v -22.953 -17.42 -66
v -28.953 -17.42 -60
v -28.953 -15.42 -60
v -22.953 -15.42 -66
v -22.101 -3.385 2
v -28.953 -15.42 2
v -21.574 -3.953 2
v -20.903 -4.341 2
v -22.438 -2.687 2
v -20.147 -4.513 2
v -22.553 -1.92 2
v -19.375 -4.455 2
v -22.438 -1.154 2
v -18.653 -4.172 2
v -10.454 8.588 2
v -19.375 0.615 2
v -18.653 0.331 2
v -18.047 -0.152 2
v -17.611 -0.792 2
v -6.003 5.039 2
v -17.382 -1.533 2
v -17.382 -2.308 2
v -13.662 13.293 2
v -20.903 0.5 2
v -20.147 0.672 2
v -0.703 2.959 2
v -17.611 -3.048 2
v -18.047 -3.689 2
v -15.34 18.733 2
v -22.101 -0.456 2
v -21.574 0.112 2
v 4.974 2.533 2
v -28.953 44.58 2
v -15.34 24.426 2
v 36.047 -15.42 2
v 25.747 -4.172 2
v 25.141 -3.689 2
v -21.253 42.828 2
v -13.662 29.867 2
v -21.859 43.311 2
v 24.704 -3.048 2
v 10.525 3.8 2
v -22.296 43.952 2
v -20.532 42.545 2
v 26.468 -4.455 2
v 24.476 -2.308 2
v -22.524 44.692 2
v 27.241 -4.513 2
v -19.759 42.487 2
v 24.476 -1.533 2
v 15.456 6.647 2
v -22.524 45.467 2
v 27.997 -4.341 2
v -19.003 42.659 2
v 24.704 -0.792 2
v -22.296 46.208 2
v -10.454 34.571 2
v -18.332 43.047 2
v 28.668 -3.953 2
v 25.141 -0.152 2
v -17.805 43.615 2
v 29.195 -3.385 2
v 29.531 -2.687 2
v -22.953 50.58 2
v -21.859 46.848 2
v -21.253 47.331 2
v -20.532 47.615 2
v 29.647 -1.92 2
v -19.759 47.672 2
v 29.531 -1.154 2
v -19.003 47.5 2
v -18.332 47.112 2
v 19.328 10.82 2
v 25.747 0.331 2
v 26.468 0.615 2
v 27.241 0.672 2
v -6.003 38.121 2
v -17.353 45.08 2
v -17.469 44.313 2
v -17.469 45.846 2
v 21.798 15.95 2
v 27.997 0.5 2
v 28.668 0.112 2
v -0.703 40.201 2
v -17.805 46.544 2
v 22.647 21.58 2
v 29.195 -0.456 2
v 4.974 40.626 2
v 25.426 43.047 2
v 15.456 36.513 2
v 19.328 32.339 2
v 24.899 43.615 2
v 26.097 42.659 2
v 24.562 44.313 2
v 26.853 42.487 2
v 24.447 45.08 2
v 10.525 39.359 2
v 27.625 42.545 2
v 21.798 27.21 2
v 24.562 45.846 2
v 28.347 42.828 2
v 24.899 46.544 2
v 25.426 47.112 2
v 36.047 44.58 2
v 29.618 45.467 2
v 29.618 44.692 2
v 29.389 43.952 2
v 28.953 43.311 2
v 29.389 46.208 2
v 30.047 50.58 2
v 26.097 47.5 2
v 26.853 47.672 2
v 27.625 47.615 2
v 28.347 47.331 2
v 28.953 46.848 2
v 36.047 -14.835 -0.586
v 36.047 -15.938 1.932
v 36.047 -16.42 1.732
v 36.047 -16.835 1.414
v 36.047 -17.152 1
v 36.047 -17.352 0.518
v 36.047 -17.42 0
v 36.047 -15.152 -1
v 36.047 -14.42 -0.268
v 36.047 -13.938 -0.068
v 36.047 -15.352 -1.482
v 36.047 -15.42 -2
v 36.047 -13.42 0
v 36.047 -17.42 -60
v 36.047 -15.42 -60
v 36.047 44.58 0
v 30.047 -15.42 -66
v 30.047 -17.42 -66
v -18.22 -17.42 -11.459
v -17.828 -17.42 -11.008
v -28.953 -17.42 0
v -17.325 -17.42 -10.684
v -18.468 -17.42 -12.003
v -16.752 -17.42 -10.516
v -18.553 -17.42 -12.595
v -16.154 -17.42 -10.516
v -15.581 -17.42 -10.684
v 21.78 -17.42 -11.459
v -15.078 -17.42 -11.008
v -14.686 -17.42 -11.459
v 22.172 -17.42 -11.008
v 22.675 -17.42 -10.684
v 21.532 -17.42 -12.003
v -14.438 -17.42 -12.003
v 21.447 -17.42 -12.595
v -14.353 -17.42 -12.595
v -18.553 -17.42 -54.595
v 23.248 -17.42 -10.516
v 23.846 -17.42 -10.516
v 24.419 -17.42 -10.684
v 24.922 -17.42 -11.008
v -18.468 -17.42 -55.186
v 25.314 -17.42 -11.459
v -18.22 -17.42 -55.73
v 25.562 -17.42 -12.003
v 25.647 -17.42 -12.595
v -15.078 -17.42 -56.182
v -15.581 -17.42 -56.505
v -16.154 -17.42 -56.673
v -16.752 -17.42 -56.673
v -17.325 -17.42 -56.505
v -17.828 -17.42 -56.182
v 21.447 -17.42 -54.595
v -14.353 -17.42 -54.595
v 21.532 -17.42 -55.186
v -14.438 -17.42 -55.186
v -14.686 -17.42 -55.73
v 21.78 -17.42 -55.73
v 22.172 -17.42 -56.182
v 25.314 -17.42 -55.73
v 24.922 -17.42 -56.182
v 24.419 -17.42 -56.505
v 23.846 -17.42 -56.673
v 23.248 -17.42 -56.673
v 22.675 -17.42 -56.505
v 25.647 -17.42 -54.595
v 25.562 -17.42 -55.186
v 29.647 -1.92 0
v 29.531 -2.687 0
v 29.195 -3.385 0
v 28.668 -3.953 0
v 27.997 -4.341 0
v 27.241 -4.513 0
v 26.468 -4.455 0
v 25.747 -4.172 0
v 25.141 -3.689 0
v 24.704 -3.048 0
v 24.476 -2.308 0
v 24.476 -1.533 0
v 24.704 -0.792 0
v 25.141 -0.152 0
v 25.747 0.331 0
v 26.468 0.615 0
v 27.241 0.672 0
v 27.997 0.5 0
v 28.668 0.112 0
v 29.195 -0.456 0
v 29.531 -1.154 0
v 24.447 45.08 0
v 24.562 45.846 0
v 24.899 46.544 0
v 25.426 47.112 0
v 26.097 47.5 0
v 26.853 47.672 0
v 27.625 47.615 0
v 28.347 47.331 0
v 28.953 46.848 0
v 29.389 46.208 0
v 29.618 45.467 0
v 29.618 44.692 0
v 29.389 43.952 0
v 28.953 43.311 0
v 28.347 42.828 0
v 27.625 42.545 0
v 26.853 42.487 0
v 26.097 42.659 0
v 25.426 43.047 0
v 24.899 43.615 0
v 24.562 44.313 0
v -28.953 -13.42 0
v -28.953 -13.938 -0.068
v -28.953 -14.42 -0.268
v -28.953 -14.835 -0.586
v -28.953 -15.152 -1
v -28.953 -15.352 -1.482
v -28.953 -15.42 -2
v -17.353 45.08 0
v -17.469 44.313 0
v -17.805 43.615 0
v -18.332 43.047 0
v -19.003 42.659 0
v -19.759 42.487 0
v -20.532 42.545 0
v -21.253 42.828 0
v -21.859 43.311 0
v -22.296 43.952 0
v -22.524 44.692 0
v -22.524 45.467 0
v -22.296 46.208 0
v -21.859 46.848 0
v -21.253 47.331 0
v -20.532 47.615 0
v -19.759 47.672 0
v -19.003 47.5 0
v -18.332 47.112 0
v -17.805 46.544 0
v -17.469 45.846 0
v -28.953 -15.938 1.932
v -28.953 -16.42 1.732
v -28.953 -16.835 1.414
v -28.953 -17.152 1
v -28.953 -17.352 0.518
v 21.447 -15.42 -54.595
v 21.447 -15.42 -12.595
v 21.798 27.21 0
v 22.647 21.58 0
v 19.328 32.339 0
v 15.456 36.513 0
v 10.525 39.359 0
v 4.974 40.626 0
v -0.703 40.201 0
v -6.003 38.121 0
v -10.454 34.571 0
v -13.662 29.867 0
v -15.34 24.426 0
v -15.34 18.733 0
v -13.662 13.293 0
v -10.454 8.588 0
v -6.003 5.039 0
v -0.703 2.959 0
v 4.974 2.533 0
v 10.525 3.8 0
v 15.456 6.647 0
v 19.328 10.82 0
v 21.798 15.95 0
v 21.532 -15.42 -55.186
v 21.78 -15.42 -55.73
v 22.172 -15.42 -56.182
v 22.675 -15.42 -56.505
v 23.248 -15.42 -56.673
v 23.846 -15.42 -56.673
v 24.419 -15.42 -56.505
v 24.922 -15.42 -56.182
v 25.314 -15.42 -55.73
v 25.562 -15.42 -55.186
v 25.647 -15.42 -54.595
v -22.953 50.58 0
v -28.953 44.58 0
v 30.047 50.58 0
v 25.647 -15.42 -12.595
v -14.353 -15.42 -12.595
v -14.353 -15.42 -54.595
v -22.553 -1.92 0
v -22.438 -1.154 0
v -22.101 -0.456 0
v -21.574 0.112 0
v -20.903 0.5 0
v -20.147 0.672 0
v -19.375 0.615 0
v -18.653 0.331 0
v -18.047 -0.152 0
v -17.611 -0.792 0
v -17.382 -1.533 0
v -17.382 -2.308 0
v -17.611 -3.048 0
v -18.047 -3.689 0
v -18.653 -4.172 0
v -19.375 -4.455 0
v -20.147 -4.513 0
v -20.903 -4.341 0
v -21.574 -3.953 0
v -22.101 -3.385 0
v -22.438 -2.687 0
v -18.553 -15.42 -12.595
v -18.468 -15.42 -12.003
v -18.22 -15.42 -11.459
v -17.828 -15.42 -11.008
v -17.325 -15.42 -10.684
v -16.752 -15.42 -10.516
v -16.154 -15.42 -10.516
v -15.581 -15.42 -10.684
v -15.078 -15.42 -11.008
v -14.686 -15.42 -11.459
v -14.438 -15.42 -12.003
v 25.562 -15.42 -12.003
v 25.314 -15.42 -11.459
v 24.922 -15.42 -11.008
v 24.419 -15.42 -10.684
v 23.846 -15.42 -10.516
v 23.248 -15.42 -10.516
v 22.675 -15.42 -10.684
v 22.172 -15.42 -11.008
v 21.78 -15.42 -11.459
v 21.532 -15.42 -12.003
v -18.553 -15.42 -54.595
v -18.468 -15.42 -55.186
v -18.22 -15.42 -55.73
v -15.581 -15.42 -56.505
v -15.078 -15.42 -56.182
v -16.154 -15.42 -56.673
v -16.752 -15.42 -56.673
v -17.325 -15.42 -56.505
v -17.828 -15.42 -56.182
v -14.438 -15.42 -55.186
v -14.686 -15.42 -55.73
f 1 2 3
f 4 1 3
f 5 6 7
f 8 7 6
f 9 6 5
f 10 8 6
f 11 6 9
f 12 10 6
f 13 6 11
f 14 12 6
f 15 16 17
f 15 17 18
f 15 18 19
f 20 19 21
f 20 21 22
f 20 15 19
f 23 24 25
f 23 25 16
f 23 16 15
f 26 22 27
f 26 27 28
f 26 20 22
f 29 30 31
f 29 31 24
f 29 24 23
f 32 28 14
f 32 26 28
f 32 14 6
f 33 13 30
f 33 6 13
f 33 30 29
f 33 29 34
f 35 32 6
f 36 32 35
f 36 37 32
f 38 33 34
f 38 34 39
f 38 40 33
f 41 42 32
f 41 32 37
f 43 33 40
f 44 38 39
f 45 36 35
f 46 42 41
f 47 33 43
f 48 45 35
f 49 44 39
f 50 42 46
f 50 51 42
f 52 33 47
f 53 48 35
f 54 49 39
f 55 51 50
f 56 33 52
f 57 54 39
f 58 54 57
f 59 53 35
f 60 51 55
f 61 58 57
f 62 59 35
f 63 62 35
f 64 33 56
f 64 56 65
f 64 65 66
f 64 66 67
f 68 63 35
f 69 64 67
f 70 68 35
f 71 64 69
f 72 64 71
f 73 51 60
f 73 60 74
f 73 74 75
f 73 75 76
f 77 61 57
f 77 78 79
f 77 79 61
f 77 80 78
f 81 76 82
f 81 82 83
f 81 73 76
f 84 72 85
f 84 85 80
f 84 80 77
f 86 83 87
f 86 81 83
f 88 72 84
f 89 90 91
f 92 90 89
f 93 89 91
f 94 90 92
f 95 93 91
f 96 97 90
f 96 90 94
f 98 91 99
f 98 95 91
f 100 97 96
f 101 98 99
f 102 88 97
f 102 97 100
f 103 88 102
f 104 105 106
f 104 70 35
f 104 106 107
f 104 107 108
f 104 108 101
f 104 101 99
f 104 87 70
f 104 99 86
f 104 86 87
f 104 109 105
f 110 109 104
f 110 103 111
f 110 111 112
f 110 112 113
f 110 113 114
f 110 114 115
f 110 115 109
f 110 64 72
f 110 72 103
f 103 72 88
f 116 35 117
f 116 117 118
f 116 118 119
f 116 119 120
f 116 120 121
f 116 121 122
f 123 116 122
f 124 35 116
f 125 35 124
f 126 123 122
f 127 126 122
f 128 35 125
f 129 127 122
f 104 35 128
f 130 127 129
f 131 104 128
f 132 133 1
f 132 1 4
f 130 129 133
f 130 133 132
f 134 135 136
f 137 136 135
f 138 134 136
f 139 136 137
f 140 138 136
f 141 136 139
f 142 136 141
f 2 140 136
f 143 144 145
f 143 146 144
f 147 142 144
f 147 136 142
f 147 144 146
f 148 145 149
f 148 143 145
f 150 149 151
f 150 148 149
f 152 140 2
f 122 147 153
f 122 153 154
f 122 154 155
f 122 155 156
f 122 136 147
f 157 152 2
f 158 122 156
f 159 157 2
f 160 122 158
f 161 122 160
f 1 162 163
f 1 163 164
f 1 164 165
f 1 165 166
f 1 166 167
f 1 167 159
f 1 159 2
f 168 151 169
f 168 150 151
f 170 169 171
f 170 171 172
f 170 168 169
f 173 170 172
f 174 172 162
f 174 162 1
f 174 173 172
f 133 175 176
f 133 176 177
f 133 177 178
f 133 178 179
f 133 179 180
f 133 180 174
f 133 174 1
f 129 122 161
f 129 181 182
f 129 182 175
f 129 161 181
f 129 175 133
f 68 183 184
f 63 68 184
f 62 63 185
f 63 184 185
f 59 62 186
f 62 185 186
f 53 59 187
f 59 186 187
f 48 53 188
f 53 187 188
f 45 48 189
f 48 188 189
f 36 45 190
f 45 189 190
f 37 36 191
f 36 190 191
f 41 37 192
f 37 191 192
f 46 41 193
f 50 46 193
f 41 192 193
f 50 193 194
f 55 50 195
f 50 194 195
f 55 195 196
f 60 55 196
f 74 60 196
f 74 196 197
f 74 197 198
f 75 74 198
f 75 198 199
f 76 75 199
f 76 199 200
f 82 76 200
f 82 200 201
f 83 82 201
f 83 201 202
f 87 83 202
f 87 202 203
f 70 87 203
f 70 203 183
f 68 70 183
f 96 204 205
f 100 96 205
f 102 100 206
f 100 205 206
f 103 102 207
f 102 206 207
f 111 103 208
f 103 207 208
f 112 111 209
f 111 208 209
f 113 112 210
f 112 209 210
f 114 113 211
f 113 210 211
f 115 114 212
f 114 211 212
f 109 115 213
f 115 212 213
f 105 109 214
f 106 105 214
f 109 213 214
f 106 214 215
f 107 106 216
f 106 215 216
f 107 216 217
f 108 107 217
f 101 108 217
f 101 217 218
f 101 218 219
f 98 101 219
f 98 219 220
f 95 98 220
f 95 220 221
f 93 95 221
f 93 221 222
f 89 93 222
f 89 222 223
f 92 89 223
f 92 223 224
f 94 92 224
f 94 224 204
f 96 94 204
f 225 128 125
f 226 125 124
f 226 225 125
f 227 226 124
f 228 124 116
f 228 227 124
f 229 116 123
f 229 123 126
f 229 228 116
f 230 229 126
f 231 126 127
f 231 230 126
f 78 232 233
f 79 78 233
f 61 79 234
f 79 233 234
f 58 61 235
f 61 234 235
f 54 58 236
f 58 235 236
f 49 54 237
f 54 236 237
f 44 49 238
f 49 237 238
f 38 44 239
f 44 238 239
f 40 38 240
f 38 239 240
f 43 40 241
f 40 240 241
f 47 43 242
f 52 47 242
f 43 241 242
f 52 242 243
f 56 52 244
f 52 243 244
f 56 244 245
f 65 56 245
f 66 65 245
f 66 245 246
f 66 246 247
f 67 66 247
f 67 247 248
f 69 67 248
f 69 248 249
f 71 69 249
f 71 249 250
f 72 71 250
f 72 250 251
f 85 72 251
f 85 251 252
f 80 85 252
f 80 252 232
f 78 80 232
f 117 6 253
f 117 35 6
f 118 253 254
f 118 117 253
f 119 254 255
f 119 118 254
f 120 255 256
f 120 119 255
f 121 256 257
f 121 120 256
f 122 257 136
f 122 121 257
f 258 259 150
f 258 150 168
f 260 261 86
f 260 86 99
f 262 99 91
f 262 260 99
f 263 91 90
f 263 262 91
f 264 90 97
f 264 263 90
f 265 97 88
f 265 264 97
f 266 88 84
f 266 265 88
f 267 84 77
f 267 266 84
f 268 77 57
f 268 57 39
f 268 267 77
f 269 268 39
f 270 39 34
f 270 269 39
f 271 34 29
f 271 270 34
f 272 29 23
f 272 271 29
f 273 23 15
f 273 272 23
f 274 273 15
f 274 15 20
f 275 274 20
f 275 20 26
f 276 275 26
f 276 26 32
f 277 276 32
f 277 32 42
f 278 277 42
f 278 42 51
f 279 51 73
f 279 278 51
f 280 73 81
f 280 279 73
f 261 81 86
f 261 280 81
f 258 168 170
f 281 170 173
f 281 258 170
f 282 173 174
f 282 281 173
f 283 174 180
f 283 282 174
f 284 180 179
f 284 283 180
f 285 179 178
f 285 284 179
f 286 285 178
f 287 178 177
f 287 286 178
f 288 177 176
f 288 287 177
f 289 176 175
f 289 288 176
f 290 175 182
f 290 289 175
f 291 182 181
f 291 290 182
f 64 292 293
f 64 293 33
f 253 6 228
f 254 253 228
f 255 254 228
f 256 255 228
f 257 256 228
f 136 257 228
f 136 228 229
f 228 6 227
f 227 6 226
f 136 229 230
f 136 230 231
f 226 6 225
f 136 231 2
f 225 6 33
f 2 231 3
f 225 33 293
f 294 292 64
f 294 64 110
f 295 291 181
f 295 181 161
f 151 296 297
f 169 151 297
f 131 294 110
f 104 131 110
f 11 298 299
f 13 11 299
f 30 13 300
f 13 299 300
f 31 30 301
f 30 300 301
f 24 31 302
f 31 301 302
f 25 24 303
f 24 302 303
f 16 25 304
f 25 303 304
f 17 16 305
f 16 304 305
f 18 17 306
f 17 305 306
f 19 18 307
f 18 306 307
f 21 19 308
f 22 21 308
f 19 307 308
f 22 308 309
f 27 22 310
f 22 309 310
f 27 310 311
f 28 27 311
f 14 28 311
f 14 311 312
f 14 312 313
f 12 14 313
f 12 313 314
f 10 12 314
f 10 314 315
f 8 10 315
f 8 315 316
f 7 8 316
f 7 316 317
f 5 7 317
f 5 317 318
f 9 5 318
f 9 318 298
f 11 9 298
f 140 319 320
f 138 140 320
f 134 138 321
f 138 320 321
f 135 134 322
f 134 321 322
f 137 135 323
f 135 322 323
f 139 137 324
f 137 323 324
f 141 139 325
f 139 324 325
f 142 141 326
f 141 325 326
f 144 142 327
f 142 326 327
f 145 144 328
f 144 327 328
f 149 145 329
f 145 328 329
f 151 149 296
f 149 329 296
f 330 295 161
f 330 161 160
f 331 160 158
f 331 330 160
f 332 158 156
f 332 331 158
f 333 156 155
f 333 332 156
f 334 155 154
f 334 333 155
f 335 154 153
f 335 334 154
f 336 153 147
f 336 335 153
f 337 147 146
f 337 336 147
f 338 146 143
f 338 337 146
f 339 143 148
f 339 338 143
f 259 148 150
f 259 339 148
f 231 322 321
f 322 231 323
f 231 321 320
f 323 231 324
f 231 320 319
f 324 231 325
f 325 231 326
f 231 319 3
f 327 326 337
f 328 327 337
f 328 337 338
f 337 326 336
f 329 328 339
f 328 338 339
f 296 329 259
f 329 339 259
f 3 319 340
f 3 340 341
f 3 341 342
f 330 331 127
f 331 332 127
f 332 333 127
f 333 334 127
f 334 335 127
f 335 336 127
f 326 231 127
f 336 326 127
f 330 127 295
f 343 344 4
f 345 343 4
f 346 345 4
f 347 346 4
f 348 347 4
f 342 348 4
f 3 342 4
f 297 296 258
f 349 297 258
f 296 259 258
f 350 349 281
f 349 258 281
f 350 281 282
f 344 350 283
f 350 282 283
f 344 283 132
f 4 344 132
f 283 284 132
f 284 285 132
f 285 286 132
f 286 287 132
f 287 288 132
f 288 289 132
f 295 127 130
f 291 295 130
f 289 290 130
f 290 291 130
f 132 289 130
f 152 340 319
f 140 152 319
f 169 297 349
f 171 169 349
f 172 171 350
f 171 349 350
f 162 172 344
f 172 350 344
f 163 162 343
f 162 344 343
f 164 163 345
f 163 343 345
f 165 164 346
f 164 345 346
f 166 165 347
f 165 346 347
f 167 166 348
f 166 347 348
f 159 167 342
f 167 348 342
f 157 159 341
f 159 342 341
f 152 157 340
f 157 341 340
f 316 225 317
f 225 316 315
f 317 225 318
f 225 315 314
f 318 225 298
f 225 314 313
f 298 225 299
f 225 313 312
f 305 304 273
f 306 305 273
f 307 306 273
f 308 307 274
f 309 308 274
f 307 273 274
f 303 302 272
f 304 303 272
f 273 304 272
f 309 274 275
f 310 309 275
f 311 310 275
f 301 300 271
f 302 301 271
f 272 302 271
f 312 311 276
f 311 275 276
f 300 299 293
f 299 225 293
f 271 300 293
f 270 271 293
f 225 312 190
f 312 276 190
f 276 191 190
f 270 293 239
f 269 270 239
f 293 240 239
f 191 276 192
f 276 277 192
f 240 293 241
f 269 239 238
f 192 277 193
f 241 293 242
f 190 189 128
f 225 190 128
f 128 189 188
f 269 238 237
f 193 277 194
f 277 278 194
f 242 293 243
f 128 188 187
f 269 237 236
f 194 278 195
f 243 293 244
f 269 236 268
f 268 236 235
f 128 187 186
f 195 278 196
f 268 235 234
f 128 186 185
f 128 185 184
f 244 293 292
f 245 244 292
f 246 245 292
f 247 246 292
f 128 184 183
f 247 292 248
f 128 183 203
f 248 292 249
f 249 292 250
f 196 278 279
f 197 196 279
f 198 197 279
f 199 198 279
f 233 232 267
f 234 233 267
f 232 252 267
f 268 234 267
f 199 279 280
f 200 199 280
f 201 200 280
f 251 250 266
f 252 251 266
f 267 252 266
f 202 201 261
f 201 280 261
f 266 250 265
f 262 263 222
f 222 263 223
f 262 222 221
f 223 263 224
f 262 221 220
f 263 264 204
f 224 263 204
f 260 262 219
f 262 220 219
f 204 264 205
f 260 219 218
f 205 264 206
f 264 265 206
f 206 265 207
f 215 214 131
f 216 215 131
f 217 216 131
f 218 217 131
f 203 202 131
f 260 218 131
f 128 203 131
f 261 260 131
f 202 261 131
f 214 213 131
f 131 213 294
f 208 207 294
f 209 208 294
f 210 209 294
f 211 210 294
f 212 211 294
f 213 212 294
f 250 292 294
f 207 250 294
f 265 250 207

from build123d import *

# Parameters (mm, degrees)
SKETCH_1_W          = 65
SKETCH_1_H          = 68
SKETCH_1_R          = 19.1
EXTRUDE_1_DEPTH     = 2
SKETCH_3_W          = 66
SKETCH_3_H          = 2
EXTRUDE_2_DEPTH     = 65
CUT_EXTRUDE_2_DEPTH = 101.056869815
CHAMFER_2_SIZE      = 6
CHAMFER_3_SIZE      = 6
CHAMFER_4_SIZE      = 6
CHAMFER_5_SIZE      = 6
FILLET_1_R          = 2
FILLET_2_R          = 2
SKETCH_5_R          = 2.6
CUT_EXTRUDE_3_DEPTH = 91.629366018


with BuildPart() as part:
    # 草图1 → 凸台-拉伸1 (new body)
    with BuildSketch(Plane.XY):
        with Locations((3.546875, 16.5796875)):
            Rectangle(SKETCH_1_W, SKETCH_1_H)
        with Locations((3.546875, 21.5796875)):
            Circle(SKETCH_1_R, mode=Mode.SUBTRACT)
    extrude(amount=EXTRUDE_1_DEPTH)

    # 草图3 → 凸台-拉伸2 (add)
    with BuildSketch(Plane(origin=(36.046875, 0, 0), x_dir=(0, 0, -1), z_dir=(1, 0, 0))):
        with Locations((33, -16.4203125)):
            Rectangle(SKETCH_3_W, SKETCH_3_H)
    extrude(amount=-EXTRUDE_2_DEPTH)

    # 草图4 → 切除-拉伸2 (cut, through all)
    with BuildSketch(Plane(origin=(0, -15.4203125, 0), x_dir=(1, 0, 0), z_dir=(0, 1, 0))):
        with BuildLine():
            Line((21.446875, 12.59465164), (21.446875, 54.59465164))
            ThreePointArc((21.446875, 54.59465164), (23.546875, 56.69465164), (25.646875, 54.59465164))
            Line((25.646875, 54.59465164), (25.646875, 12.59465164))
            ThreePointArc((25.646875, 12.59465164), (23.546875, 10.49465164), (21.446875, 12.59465164))
        make_face()
        with BuildLine():
            Line((-14.353125, 12.59465164), (-14.353125, 54.59465164))
            ThreePointArc((-14.353125, 54.59465164), (-16.453125, 56.69465164), (-18.553125, 54.59465164))
            Line((-18.553125, 54.59465164), (-18.553125, 12.59465164))
            ThreePointArc((-18.553125, 12.59465164), (-16.453125, 10.49465164), (-14.353125, 12.59465164))
        make_face()
    extrude(amount=-CUT_EXTRUDE_2_DEPTH, mode=Mode.SUBTRACT)

    # 倒角2
    chamfer_2_edges = [part.edges().sort_by_distance(p)[0] for p in [
        (36.046875, -16.4203125, -66),
    ]]
    chamfer(chamfer_2_edges, length=CHAMFER_2_SIZE)

    # 倒角3
    chamfer_3_edges = [part.edges().sort_by_distance(p)[0] for p in [
        (-28.953125, -16.4203125, -66),
    ]]
    chamfer(chamfer_3_edges, length=CHAMFER_3_SIZE)

    # 倒角4
    chamfer_4_edges = [part.edges().sort_by_distance(p)[0] for p in [
        (-28.953125, 50.5796875, 1),
    ]]
    chamfer(chamfer_4_edges, length=CHAMFER_4_SIZE)

    # 倒角5
    chamfer_5_edges = [part.edges().sort_by_distance(p)[0] for p in [
        (36.046875, 50.5796875, 1),
    ]]
    chamfer(chamfer_5_edges, length=CHAMFER_5_SIZE)

    # 圆角1
    fillet_1_edges = [part.edges().sort_by_distance(p)[0] for p in [
        (3.546875, -17.4203125, 2),
    ]]
    fillet(fillet_1_edges, radius=FILLET_1_R)

    # 圆角2
    fillet_2_edges = [part.edges().sort_by_distance(p)[0] for p in [
        (3.546875, -15.4203125, 0),
    ]]
    fillet(fillet_2_edges, radius=FILLET_2_R)

    # 草图5 → 切除-拉伸3 (cut, through all)
    with BuildSketch(Plane(origin=(0, 0, 0), x_dir=(-1, 0, 0), z_dir=(0, 0, -1))):
        with Locations((-27.046875, 45.0796875)):
            Circle(SKETCH_5_R)
        with Locations(Location((19.953125, 45.0796875, 0), (0, 0, 180))):
            Circle(SKETCH_5_R)
        with Locations((19.953125, -1.9203125)):
            Circle(SKETCH_5_R)
        with Locations(Location((-27.046875, -1.9203125, 0), (0, 0, 180))):
            Circle(SKETCH_5_R)
    extrude(amount=-CUT_EXTRUDE_3_DEPTH, mode=Mode.SUBTRACT)


solid = part.part
